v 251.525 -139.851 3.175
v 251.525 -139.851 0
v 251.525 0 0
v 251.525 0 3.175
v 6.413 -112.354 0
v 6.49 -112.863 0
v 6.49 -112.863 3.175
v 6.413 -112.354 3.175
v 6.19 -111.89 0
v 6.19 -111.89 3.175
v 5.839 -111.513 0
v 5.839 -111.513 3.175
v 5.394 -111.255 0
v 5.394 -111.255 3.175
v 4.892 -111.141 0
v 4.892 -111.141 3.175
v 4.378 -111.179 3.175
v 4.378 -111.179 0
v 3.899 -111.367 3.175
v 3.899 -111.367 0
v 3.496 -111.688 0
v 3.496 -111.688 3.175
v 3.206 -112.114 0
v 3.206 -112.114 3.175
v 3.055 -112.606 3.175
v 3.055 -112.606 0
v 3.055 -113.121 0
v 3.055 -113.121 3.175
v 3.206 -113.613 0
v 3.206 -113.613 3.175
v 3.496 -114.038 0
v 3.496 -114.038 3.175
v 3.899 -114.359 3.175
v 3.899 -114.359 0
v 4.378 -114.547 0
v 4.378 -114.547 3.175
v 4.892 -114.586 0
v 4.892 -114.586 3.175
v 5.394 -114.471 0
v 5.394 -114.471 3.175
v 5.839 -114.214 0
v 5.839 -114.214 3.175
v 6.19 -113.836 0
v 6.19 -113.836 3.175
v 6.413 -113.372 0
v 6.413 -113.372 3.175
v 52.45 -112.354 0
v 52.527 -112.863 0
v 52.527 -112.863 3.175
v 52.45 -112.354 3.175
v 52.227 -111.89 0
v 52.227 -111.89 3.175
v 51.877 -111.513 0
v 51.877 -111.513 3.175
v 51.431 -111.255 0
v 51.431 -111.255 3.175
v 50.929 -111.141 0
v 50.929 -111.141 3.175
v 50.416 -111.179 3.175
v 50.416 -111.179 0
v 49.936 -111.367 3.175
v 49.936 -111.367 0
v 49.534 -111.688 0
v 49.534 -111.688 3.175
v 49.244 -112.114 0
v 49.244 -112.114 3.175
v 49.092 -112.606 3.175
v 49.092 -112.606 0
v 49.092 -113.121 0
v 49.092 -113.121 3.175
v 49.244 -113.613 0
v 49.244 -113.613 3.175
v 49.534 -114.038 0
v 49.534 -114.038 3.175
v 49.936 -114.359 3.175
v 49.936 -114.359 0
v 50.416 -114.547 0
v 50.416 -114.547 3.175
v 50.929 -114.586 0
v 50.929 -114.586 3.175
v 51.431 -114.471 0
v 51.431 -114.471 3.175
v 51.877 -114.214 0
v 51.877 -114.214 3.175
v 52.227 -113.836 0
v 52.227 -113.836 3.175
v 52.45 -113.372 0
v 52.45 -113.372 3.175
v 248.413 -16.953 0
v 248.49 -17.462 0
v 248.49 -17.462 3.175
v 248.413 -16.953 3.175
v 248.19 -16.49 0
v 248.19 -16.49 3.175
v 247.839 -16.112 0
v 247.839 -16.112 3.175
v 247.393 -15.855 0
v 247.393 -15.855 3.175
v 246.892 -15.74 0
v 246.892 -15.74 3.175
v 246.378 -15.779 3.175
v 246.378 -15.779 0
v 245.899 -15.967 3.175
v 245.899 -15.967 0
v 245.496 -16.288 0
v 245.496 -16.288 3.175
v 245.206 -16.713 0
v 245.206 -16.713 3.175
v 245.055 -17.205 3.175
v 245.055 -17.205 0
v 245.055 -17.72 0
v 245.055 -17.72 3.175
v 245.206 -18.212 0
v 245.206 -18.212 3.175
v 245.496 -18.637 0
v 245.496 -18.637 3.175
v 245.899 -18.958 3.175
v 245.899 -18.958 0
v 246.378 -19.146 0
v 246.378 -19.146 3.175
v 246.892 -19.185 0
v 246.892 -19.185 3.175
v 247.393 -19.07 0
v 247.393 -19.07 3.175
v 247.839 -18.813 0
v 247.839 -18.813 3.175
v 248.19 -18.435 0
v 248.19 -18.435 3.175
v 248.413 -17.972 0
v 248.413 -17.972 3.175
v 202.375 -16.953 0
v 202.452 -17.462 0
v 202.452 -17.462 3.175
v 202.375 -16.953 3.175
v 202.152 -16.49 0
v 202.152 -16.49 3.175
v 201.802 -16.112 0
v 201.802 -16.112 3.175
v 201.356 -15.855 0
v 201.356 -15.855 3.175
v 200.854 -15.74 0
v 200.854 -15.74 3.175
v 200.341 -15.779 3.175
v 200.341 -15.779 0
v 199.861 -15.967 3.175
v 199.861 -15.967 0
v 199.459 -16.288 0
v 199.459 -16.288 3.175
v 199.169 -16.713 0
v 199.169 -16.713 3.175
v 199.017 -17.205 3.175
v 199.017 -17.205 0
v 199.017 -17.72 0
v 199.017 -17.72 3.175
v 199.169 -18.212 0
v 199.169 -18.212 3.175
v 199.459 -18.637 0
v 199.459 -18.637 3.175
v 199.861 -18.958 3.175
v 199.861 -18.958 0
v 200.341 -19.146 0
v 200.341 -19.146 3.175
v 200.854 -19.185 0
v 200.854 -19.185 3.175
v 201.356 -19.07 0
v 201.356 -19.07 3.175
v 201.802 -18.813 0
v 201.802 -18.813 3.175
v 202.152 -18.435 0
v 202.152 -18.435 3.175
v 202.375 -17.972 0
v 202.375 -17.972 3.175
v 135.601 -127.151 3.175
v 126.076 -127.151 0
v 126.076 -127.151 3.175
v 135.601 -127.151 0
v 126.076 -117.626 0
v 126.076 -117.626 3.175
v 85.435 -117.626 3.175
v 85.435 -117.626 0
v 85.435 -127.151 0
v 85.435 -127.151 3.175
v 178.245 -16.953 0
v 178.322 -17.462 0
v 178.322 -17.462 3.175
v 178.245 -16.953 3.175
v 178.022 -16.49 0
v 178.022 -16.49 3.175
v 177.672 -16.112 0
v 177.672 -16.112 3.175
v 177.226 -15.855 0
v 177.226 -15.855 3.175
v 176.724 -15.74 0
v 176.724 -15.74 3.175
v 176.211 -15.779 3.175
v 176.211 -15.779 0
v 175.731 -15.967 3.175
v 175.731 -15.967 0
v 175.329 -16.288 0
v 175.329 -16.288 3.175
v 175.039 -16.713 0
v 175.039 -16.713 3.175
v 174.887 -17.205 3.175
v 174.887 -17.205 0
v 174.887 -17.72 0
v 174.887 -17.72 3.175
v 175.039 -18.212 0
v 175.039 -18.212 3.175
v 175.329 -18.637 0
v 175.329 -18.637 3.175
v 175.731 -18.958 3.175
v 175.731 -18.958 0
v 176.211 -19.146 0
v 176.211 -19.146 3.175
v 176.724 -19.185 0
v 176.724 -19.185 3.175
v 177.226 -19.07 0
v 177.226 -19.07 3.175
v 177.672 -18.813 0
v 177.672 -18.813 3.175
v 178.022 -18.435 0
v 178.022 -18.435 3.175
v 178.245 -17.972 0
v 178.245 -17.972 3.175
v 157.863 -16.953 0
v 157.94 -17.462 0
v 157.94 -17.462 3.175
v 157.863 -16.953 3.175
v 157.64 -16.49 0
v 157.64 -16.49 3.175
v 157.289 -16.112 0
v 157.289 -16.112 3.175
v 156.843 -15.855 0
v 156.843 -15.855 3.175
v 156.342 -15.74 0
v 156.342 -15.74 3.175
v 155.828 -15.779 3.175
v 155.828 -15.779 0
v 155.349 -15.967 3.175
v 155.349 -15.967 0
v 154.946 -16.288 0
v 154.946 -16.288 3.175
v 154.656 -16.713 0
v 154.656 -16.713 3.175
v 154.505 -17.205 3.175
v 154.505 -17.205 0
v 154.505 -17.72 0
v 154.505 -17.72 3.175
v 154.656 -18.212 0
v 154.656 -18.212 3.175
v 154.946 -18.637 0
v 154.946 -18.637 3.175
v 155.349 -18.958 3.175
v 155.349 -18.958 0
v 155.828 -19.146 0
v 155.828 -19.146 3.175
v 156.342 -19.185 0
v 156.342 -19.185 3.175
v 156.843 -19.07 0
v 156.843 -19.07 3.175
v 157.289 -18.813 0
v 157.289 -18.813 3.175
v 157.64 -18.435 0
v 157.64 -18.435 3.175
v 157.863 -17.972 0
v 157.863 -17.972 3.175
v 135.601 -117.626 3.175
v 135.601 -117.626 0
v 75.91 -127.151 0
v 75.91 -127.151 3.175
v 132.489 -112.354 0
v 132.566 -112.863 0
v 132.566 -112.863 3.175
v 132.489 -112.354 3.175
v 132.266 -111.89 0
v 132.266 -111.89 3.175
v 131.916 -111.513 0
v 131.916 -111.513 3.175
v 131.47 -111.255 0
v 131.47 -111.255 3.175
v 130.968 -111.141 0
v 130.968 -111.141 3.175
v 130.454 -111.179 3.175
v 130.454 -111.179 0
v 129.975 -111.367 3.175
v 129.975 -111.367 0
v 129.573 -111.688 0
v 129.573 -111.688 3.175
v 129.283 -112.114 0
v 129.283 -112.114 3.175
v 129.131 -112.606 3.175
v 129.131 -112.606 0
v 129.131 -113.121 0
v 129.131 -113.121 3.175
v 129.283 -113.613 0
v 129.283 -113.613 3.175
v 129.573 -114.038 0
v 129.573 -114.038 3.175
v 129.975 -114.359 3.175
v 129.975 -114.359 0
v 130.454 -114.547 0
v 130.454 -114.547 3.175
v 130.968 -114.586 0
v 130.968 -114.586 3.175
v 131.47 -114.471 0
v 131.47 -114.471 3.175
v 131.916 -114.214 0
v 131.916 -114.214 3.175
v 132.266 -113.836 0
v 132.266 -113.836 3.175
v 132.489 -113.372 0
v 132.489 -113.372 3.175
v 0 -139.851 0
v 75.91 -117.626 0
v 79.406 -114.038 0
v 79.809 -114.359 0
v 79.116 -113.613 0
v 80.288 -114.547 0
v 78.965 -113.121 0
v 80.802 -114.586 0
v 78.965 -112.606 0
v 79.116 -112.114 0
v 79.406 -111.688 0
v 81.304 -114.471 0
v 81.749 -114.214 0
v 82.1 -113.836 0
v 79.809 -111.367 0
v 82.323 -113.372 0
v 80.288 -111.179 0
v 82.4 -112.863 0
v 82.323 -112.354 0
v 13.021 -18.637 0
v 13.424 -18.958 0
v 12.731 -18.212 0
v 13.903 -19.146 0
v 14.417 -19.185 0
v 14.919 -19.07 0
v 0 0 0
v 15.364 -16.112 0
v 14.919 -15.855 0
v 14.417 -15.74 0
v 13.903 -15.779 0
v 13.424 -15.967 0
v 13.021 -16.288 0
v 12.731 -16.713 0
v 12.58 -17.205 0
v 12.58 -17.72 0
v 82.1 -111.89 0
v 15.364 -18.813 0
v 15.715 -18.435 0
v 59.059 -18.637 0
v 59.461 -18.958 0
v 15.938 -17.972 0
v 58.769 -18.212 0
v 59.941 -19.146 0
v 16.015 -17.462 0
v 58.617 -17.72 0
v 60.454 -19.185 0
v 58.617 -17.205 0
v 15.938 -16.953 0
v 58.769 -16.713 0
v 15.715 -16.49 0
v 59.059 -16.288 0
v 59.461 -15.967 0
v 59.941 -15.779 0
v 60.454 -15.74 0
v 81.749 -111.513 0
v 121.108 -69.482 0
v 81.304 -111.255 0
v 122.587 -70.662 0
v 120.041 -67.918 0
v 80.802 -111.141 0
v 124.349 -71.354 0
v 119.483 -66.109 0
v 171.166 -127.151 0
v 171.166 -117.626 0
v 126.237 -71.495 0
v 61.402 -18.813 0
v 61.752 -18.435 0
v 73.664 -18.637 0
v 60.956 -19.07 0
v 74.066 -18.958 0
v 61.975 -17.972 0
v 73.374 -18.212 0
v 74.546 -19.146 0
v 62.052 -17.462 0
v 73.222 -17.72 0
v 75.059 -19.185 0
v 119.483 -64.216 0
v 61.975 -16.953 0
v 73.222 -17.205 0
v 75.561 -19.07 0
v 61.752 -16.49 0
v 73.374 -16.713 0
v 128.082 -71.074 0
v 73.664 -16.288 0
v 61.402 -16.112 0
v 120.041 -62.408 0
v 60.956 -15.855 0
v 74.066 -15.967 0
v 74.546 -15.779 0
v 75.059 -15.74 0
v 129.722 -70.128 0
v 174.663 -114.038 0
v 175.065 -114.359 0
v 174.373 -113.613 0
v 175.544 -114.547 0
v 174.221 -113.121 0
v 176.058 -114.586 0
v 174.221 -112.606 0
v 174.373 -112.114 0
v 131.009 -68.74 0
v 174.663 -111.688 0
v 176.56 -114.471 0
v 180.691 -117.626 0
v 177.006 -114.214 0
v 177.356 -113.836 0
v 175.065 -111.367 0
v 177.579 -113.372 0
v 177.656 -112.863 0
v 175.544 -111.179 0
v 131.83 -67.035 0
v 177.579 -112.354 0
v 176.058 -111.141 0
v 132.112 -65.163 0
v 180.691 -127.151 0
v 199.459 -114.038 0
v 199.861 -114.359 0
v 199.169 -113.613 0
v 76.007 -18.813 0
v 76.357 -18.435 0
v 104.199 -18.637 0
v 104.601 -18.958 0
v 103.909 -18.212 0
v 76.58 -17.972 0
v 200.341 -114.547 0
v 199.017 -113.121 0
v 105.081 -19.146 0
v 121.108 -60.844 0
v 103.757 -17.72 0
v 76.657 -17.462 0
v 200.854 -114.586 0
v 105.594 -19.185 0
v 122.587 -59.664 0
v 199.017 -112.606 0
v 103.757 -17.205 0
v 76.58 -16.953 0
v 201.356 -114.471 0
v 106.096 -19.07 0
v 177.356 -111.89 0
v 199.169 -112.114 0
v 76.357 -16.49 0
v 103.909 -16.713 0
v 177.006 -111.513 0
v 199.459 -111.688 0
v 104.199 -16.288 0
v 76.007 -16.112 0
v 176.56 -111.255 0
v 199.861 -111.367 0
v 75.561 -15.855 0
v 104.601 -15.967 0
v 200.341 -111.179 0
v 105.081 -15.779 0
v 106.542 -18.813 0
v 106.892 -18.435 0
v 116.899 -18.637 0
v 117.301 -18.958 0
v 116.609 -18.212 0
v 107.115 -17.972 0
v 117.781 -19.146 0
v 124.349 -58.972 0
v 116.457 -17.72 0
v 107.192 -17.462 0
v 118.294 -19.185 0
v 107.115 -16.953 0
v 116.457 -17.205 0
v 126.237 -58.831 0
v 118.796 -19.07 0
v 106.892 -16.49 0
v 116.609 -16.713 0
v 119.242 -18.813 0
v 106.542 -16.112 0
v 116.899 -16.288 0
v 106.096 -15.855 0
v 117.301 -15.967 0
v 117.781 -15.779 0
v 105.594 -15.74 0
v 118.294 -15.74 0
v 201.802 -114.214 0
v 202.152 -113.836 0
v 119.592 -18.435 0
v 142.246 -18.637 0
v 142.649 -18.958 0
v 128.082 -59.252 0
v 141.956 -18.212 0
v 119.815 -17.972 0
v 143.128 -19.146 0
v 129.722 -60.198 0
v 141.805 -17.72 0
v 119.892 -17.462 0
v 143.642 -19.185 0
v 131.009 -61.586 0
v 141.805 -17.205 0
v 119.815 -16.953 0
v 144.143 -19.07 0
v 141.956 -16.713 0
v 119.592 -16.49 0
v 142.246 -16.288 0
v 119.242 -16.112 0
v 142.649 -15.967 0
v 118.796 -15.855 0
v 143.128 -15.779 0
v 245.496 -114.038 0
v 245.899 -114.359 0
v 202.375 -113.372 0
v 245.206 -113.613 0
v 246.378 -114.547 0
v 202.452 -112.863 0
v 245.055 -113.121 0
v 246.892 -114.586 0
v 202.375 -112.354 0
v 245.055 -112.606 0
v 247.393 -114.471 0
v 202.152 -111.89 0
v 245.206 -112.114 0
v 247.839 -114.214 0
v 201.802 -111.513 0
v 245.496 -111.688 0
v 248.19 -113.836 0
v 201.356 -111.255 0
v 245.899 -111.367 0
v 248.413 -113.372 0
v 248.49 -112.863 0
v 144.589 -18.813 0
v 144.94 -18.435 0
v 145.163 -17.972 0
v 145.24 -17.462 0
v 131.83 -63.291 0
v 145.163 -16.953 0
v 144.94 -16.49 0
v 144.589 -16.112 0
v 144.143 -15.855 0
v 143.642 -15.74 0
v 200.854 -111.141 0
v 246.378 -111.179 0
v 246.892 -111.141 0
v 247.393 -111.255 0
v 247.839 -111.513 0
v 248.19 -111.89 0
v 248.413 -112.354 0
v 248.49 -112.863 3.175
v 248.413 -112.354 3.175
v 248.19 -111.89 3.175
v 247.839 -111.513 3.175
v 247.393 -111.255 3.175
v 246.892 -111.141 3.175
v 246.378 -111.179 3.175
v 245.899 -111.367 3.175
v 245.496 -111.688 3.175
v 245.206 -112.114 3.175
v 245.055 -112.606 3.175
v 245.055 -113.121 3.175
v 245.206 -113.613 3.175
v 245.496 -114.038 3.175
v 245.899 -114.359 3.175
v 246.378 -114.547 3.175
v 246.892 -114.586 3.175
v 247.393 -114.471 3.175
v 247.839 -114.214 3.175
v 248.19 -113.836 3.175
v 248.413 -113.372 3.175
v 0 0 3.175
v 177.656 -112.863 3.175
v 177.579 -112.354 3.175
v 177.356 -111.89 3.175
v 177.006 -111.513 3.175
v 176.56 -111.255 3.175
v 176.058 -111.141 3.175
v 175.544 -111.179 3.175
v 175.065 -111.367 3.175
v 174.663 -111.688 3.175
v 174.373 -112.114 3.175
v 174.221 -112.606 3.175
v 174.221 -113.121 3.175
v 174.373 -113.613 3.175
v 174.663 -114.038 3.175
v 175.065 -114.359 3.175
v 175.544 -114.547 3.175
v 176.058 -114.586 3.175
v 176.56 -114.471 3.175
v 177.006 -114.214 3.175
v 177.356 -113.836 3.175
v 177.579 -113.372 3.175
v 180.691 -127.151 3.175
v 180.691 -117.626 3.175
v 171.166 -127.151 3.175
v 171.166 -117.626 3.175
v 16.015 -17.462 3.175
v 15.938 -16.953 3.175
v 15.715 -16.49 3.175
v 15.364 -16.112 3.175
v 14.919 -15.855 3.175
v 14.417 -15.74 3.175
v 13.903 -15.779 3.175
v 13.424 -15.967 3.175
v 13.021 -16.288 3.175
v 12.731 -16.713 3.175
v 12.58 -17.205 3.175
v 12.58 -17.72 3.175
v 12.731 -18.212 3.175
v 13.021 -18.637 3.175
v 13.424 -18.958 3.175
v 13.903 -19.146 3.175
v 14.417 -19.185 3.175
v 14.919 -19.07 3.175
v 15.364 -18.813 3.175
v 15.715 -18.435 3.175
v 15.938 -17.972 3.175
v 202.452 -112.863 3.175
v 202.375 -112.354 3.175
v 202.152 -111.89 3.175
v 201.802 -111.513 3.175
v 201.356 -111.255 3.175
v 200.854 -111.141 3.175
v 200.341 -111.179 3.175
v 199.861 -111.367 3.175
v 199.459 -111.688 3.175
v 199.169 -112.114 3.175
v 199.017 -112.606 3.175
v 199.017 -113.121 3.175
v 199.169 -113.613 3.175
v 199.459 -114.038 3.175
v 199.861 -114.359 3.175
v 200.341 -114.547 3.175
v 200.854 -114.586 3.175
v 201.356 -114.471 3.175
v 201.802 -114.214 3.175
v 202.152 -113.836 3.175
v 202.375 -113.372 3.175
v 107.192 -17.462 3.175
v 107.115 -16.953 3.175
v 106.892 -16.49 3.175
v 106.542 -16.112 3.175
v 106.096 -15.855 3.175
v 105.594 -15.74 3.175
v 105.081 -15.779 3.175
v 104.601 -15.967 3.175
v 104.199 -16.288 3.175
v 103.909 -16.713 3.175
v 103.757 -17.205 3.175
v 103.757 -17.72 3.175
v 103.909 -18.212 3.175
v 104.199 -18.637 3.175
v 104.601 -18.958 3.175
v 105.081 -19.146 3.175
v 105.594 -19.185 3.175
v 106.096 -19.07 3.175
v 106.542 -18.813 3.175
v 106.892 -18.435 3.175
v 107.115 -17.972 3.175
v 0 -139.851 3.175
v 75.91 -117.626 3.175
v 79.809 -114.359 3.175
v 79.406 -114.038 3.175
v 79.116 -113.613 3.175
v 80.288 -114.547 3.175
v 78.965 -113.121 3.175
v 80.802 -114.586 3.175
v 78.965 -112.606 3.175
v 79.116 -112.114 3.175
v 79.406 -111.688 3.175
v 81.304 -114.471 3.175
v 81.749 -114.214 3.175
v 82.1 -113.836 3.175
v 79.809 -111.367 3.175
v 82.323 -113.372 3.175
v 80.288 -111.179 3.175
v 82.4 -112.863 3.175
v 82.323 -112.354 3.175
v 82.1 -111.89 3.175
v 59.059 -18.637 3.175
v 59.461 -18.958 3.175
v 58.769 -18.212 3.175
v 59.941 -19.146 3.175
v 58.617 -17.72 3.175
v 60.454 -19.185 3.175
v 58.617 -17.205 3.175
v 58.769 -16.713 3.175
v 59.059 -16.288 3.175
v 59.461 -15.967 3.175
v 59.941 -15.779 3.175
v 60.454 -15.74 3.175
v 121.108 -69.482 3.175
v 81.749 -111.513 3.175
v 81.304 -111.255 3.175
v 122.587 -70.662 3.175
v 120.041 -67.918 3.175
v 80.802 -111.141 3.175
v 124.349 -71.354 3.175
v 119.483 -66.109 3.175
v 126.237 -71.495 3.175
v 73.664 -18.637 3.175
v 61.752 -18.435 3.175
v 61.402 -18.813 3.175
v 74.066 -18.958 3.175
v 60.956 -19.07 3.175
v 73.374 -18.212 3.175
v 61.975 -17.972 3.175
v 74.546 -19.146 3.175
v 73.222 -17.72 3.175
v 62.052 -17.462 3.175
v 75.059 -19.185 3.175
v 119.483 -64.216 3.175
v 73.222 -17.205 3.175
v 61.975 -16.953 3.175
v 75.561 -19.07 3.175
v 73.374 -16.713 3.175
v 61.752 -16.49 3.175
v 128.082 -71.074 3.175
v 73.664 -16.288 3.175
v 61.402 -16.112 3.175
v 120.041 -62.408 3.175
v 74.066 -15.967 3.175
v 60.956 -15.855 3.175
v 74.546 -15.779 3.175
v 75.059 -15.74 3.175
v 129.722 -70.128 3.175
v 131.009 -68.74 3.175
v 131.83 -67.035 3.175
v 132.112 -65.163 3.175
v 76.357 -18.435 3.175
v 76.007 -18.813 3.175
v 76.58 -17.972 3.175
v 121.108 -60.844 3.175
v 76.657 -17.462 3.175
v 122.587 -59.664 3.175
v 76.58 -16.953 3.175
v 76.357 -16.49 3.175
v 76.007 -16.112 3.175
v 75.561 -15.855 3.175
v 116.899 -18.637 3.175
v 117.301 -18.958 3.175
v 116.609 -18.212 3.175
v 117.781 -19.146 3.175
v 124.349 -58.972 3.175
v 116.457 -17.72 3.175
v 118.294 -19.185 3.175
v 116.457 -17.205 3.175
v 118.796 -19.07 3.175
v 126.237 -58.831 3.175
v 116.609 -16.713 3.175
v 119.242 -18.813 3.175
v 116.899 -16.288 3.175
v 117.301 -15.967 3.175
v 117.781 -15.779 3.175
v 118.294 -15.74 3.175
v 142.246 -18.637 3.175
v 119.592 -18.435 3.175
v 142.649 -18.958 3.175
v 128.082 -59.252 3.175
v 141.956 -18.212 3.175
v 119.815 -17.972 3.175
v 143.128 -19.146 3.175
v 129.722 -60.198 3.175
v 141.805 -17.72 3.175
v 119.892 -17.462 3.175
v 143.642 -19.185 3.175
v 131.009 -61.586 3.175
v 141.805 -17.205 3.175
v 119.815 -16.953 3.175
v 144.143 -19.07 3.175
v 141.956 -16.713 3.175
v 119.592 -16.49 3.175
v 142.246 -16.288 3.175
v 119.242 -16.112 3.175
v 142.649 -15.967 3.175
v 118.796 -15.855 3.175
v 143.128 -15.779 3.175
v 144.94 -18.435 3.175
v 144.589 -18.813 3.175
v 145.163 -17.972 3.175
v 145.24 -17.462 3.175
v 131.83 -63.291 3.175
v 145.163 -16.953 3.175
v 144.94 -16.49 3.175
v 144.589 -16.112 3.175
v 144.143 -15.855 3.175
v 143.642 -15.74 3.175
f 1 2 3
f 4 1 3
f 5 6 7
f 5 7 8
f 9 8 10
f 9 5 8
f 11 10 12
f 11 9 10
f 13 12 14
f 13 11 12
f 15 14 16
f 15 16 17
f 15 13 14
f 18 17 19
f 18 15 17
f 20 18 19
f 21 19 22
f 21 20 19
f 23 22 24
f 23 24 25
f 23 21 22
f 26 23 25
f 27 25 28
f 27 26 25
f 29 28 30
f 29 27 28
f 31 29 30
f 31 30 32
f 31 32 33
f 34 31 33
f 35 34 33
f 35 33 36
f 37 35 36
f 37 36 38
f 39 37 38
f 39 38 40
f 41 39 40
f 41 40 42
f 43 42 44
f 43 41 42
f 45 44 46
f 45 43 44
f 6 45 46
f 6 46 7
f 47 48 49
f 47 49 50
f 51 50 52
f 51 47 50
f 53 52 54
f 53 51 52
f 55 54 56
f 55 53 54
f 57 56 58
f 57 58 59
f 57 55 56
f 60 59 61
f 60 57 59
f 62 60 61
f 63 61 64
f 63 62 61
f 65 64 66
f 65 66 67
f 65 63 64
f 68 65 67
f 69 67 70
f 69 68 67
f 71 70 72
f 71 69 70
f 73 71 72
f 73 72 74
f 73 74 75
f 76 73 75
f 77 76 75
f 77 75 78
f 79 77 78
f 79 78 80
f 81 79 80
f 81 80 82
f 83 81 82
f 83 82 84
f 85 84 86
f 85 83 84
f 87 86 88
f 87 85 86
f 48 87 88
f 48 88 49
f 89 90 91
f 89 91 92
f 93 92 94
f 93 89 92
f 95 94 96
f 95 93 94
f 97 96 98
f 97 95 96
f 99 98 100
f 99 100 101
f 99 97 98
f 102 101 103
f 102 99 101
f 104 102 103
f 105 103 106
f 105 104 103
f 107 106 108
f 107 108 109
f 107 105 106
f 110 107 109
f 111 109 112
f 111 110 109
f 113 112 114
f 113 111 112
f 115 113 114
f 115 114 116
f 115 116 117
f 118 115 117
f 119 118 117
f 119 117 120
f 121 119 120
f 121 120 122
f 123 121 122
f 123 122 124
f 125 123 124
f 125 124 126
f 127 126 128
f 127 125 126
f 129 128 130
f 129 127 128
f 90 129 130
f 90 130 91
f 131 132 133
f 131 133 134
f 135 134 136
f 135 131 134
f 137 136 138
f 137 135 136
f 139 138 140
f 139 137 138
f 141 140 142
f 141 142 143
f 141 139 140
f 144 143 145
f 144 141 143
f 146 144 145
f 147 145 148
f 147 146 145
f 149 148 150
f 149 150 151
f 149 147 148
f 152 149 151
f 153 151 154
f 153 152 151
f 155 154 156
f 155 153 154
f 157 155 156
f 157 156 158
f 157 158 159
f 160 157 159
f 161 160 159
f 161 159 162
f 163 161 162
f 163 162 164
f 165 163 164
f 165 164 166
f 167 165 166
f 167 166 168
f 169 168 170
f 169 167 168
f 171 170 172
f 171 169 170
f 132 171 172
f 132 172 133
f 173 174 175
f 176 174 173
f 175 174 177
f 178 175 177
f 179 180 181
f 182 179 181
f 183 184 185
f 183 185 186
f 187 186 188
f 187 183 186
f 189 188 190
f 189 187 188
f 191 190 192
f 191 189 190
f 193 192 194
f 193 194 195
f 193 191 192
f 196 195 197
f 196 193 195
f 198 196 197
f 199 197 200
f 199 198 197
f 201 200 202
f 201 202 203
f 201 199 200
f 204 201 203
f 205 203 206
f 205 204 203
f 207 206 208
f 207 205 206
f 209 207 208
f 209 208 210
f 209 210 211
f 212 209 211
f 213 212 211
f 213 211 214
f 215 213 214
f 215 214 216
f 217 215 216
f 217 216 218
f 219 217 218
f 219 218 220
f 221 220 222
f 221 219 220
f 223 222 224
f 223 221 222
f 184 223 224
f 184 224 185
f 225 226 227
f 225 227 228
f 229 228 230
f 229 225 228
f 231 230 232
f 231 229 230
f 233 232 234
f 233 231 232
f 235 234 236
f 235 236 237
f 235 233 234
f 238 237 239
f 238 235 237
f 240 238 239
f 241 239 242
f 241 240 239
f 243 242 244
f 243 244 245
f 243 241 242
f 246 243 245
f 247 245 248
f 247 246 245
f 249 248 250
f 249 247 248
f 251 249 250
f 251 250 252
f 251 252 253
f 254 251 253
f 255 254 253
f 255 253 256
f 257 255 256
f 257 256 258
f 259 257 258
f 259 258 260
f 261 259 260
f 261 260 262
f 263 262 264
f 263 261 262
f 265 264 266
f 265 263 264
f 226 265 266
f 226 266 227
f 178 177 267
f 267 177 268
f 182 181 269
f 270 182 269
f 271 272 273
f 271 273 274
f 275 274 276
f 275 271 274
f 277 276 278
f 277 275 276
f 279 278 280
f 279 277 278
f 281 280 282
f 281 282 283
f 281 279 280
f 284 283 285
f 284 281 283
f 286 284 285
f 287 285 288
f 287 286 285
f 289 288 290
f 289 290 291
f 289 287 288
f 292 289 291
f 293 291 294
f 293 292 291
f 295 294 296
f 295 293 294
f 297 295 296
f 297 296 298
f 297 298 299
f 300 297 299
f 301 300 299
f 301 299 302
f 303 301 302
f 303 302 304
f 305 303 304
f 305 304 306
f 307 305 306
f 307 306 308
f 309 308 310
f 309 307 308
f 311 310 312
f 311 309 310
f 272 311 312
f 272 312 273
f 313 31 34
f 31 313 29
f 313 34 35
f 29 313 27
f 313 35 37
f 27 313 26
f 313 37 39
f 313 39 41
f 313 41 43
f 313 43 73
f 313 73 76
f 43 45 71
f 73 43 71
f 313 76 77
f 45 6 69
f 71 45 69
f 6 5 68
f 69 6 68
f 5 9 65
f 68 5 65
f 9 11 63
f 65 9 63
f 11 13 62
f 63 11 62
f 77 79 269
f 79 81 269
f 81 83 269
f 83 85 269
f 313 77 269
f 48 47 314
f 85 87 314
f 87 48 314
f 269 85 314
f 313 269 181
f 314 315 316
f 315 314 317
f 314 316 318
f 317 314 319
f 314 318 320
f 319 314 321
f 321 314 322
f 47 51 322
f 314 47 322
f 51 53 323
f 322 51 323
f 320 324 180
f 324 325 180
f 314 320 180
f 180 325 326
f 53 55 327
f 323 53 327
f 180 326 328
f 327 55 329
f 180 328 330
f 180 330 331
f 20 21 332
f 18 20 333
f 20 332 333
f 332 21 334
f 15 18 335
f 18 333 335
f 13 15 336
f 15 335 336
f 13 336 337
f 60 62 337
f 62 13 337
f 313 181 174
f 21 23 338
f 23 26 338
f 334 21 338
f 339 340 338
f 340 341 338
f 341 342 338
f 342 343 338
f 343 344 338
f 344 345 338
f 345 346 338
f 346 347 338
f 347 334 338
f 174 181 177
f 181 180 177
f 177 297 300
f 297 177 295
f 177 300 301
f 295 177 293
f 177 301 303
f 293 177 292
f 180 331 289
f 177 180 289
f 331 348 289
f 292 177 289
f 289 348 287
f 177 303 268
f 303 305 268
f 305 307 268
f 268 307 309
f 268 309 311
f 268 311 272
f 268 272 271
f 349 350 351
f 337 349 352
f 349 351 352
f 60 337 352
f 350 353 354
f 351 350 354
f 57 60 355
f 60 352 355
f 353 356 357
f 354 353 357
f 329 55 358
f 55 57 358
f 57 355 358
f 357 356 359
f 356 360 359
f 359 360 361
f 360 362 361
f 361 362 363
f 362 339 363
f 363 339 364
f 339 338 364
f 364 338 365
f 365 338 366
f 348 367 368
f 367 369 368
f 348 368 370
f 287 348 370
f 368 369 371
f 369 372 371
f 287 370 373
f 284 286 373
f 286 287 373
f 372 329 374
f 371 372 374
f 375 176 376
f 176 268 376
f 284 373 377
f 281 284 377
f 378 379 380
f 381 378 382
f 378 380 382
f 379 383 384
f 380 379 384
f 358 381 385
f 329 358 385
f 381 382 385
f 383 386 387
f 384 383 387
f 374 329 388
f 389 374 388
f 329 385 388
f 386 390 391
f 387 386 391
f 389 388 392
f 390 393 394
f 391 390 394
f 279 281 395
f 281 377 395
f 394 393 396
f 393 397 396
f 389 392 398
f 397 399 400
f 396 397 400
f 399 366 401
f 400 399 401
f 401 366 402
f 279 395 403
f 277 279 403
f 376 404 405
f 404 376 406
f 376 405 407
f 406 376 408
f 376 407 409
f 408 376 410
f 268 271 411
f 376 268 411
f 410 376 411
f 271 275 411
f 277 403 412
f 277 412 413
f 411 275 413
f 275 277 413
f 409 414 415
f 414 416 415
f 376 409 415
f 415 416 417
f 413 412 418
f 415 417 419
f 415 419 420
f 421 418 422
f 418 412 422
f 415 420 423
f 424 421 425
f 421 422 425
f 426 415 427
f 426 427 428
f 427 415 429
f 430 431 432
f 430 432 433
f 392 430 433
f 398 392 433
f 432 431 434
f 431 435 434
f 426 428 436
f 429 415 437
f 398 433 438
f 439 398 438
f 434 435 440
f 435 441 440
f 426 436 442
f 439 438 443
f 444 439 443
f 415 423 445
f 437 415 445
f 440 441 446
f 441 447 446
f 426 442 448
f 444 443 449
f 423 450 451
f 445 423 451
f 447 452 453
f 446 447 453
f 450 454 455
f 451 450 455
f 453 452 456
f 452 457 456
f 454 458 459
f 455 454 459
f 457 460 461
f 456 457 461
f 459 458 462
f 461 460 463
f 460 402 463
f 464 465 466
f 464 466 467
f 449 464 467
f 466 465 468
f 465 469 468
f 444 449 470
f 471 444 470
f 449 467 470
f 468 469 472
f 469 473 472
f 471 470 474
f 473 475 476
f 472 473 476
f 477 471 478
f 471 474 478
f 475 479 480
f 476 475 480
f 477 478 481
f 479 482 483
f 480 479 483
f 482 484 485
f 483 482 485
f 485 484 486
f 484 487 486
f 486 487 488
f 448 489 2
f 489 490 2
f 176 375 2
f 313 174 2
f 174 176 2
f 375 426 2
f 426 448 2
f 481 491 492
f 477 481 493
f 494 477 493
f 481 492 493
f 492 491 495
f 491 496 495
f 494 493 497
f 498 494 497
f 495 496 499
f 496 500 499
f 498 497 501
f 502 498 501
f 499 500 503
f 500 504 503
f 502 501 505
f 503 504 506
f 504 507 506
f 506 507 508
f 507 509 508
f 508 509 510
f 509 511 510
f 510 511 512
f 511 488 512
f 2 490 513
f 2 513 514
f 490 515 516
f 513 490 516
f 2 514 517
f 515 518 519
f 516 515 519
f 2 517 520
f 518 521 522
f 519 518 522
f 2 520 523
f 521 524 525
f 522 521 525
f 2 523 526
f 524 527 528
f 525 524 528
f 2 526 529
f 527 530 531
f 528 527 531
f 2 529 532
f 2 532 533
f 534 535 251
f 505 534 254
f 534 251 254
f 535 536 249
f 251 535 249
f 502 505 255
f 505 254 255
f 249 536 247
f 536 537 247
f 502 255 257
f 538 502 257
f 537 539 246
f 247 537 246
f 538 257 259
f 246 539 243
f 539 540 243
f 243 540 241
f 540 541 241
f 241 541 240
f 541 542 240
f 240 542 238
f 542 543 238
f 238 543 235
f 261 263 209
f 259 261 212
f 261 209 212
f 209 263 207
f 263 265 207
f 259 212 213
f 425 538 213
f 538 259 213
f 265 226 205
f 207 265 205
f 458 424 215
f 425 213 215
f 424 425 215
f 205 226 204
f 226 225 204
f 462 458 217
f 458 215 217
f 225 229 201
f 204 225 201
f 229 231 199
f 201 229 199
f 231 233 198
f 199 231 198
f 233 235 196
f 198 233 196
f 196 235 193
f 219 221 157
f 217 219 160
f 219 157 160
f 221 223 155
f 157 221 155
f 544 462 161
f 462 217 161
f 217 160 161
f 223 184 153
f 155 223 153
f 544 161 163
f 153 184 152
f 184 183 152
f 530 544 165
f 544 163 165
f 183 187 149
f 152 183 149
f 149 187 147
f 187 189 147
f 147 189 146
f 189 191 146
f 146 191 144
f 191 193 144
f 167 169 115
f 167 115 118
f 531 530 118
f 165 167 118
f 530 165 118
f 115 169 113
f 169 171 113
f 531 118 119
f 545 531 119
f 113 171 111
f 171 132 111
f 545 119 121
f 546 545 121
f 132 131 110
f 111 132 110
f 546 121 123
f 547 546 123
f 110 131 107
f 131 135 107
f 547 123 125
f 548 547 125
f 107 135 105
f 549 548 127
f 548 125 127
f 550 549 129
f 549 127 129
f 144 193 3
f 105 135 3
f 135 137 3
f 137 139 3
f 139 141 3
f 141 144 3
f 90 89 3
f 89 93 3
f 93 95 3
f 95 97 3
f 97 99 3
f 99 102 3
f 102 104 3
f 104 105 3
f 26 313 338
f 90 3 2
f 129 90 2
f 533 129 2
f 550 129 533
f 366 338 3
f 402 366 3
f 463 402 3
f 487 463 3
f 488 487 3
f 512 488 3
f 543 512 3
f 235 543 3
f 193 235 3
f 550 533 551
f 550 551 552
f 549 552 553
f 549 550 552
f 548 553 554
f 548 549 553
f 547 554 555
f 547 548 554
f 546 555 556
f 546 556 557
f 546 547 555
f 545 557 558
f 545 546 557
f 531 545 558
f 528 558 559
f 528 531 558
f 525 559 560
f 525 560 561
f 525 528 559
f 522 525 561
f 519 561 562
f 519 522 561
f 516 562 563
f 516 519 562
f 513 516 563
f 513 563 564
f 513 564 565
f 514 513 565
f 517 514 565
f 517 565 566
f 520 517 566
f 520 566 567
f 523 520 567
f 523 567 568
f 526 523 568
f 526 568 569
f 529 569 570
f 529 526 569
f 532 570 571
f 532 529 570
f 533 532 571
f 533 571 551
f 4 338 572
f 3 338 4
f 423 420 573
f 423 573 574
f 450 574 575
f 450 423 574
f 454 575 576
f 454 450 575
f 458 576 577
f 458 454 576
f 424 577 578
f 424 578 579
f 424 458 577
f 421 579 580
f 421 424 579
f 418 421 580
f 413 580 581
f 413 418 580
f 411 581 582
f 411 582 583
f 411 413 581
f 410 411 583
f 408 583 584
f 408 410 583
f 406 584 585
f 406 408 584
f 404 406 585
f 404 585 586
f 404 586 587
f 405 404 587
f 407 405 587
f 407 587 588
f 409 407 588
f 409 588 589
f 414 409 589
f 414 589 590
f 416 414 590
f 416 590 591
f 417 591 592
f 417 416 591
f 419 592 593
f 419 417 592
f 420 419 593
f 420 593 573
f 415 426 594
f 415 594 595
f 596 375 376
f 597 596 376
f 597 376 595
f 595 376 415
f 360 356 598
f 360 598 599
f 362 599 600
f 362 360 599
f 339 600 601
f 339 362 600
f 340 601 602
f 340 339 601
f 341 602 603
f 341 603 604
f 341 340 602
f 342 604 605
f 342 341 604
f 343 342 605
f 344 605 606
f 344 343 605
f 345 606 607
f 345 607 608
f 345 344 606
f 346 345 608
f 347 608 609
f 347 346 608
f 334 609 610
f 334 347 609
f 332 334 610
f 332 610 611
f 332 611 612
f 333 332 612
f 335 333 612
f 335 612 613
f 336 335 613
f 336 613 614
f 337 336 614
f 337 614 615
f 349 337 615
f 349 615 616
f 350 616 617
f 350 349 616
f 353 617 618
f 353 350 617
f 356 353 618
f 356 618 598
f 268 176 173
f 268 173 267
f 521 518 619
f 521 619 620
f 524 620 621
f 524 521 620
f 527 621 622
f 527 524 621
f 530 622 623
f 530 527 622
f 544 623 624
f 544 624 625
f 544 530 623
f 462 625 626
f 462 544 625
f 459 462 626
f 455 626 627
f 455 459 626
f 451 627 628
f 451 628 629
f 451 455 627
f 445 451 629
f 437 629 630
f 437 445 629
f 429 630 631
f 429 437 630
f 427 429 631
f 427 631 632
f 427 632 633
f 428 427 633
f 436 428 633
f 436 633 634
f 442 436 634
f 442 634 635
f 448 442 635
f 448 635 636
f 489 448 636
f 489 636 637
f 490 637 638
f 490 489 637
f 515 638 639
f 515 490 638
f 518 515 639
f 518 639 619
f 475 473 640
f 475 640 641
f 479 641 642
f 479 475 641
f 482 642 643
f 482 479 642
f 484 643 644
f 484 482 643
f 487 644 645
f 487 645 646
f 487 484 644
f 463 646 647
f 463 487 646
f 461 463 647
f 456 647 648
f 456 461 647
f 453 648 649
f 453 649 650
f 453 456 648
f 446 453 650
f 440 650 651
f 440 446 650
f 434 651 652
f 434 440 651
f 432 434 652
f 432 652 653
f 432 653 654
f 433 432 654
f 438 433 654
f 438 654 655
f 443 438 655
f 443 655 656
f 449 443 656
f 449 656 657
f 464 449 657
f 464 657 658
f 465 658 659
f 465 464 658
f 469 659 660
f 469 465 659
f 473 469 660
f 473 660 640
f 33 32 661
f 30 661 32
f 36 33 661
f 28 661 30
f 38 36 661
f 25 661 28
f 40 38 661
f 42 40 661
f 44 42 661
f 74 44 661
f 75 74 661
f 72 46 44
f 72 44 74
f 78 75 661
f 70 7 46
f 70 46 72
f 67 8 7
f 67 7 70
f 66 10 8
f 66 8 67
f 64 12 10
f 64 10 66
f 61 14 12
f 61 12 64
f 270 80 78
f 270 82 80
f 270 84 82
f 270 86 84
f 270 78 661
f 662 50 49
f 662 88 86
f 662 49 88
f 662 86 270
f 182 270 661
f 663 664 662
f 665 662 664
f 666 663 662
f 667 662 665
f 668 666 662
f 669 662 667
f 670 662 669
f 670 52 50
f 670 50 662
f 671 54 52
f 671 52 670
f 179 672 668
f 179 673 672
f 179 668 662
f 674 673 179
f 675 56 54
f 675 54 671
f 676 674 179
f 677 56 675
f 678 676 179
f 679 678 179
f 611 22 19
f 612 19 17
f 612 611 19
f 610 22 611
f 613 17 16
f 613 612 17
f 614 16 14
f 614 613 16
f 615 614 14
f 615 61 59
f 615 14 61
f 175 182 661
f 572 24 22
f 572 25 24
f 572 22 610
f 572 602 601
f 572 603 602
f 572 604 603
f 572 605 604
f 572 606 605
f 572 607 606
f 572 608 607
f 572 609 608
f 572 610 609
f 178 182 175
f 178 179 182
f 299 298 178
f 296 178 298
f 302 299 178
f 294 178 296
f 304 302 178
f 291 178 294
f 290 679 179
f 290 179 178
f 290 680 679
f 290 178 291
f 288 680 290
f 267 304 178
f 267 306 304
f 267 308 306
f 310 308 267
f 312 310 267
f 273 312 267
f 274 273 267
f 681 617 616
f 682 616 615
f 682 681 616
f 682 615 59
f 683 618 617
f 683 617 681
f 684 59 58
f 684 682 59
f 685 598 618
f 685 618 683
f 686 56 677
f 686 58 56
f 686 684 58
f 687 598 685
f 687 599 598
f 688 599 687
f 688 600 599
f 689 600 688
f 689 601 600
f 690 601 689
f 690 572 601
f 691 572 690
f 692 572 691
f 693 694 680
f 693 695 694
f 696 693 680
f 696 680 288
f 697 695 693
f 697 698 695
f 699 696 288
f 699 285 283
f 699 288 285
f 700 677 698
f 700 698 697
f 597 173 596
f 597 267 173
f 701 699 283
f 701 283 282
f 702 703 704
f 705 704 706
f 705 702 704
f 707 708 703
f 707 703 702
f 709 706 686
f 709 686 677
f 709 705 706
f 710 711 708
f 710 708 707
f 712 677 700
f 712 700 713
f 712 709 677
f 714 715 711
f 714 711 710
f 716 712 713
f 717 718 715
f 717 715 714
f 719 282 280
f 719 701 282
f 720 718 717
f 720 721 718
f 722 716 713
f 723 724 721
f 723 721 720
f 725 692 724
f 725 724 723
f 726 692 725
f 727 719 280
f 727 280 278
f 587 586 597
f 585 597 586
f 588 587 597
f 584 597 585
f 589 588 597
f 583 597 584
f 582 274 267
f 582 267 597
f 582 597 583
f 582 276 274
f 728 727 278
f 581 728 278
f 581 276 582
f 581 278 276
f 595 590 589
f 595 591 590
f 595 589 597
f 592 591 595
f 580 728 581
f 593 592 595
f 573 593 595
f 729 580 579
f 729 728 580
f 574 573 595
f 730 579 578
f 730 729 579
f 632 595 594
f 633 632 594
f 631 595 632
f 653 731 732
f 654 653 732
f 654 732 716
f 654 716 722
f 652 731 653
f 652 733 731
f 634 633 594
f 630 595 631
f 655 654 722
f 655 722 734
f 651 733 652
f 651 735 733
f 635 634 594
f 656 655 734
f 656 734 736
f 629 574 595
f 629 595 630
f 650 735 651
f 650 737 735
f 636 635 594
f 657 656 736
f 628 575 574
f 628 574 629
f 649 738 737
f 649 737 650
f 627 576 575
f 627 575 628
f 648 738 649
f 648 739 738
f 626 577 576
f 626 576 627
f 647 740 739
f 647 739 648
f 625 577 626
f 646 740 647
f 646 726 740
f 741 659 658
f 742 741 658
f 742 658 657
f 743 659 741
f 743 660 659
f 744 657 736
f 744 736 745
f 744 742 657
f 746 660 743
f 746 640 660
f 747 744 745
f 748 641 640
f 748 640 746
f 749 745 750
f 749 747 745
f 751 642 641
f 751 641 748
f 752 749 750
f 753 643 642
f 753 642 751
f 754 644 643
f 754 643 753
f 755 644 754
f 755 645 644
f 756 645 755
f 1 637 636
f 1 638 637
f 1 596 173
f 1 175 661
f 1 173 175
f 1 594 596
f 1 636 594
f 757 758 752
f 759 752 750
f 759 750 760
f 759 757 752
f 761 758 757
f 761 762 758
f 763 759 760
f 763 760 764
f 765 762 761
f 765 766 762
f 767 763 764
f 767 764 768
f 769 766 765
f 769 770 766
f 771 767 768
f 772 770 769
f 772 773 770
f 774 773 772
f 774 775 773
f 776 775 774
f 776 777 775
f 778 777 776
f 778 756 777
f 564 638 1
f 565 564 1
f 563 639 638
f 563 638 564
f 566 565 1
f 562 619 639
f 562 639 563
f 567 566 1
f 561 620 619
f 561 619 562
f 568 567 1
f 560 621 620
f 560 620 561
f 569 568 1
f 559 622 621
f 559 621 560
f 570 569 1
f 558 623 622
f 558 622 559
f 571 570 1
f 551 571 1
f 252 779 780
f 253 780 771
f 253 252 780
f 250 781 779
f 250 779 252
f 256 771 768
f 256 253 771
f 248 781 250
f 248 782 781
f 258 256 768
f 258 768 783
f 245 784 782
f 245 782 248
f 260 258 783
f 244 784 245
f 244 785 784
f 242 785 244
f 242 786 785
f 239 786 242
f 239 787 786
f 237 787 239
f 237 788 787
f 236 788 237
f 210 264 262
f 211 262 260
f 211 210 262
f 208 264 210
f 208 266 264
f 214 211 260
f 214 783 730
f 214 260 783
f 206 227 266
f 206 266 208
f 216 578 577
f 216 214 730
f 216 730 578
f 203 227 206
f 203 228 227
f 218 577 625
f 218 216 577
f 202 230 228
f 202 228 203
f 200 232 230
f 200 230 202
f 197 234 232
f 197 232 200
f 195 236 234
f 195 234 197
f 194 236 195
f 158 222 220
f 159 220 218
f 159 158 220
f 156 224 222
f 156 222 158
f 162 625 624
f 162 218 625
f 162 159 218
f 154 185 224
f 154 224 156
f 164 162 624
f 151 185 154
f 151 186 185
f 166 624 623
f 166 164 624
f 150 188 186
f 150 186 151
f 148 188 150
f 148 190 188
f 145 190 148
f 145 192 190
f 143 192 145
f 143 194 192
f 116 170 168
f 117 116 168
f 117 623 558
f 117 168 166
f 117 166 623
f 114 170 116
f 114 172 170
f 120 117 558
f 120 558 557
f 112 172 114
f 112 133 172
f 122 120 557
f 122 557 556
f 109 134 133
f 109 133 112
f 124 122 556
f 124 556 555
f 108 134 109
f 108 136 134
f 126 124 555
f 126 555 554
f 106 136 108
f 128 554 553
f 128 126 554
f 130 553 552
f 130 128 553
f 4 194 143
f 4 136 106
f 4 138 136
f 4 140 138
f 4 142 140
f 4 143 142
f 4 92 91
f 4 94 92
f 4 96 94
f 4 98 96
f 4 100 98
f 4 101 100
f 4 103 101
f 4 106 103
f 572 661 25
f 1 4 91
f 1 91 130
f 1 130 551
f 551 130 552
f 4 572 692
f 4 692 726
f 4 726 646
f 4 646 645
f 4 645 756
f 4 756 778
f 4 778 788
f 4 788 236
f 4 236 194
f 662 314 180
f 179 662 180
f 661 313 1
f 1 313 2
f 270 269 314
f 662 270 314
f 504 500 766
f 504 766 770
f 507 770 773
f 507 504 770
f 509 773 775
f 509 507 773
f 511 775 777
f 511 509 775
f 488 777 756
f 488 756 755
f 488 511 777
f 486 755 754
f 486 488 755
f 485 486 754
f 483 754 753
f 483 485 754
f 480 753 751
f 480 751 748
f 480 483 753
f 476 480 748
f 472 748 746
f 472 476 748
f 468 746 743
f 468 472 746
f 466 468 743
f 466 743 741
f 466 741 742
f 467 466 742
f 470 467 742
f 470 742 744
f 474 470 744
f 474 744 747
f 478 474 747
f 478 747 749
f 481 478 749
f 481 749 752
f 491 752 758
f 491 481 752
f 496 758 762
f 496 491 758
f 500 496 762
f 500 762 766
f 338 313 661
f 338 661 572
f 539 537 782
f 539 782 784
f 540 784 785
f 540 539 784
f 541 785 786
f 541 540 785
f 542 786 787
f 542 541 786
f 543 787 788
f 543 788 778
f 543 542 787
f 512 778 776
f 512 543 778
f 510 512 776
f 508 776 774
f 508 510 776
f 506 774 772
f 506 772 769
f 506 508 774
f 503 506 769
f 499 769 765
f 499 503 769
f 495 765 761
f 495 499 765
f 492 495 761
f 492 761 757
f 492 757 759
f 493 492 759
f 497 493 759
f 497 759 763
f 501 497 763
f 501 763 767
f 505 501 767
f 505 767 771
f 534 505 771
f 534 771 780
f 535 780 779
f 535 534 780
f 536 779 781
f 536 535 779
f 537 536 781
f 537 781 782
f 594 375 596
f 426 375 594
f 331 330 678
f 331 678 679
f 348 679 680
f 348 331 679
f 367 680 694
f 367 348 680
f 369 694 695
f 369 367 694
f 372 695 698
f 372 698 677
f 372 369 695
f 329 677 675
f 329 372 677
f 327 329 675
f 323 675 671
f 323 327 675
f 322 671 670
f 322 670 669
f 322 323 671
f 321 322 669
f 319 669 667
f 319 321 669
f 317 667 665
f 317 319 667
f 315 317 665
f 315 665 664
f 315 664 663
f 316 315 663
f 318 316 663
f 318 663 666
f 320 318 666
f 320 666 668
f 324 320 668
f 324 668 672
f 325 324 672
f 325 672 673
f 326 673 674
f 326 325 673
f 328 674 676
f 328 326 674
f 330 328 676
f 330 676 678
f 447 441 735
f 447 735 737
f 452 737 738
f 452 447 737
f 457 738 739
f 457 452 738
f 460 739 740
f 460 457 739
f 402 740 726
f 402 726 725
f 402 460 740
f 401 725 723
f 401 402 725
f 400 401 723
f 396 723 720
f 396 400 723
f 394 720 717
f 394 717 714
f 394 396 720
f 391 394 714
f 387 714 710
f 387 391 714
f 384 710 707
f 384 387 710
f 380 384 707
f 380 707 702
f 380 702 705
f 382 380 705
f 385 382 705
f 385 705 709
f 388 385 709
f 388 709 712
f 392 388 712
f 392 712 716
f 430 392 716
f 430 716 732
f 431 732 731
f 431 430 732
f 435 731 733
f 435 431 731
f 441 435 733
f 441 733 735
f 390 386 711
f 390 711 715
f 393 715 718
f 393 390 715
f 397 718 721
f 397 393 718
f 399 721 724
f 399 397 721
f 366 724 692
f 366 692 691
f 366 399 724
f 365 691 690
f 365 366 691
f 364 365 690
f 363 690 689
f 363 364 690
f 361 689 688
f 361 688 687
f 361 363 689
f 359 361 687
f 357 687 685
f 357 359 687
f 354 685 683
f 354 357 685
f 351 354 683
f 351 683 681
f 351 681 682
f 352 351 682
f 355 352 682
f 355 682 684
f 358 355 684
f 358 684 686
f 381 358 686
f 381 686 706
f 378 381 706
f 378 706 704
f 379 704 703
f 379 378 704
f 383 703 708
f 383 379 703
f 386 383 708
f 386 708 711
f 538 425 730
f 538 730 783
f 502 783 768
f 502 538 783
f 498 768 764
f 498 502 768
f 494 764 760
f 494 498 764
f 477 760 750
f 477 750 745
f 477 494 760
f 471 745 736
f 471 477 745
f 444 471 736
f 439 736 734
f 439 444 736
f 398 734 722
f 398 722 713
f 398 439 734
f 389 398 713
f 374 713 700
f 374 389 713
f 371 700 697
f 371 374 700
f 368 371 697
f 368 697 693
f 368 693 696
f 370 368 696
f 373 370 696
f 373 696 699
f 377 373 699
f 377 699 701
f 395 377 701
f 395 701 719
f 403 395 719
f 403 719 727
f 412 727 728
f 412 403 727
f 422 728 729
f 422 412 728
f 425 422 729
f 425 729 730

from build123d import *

# Parameters (mm, degrees)
F0_W     = 251.524948
F0_H     = 139.850774
F0_R     = 1.7272
F0_W_2   = 9.525
F0_H_2   = 9.525
F0_R_2   = 6.35
F1_DEPTH = 3.175


with BuildPart() as f1:
    # F0 (on Top) → F1 (new body)
    with BuildSketch(Plane.XY):
        with Locations((125.762474, -69.925387)):
            Rectangle(F0_W, F0_H)
        with Locations((4.7625, -112.863274)):
            Circle(F0_R, mode=Mode.SUBTRACT)
        with Locations((50.8, -112.863274)):
            Circle(F0_R, mode=Mode.SUBTRACT)
        Polygon((85.434995, -117.625774), (85.434995, -127.150774), (75.909995, -127.150774), (75.909995, -117.625774), align=None, mode=Mode.SUBTRACT)
        with Locations((80.672495, -112.863274)):
            Circle(F0_R, mode=Mode.SUBTRACT)
        with Locations((130.838715, -122.388274)):
            Rectangle(F0_W_2, F0_H_2, mode=Mode.SUBTRACT)
        with Locations((175.928693, -122.388274)):
            Rectangle(F0_W_2, F0_H_2, mode=Mode.SUBTRACT)
        with Locations((130.838715, -112.863274)):
            Circle(F0_R, mode=Mode.SUBTRACT)
        with Locations((175.928693, -112.863274)):
            Circle(F0_R, mode=Mode.SUBTRACT)
        with Locations((200.724948, -112.863274)):
            Circle(F0_R, mode=Mode.SUBTRACT)
        with Locations((246.762448, -112.863274)):
            Circle(F0_R, mode=Mode.SUBTRACT)
        with Locations((14.2875, -17.4625)):
            Circle(F0_R, mode=Mode.SUBTRACT)
        with Locations((60.325, -17.4625)):
            Circle(F0_R, mode=Mode.SUBTRACT)
        with Locations((74.93, -17.4625)):
            Circle(F0_R, mode=Mode.SUBTRACT)
        with Locations((105.464991, -17.4625)):
            Circle(F0_R, mode=Mode.SUBTRACT)
        with Locations((118.164991, -17.4625)):
            Circle(F0_R, mode=Mode.SUBTRACT)
        with Locations((125.762474, -65.162887)):
            Circle(F0_R_2, mode=Mode.SUBTRACT)
        with Locations((143.512438, -17.4625)):
            Circle(F0_R, mode=Mode.SUBTRACT)
        with Locations((156.212438, -17.4625)):
            Circle(F0_R, mode=Mode.SUBTRACT)
        with Locations((176.594948, -17.4625)):
            Circle(F0_R, mode=Mode.SUBTRACT)
        with Locations((200.724948, -17.4625)):
            Circle(F0_R, mode=Mode.SUBTRACT)
        with Locations((246.762448, -17.4625)):
            Circle(F0_R, mode=Mode.SUBTRACT)
    extrude(amount=F1_DEPTH)


solid = f1.part
